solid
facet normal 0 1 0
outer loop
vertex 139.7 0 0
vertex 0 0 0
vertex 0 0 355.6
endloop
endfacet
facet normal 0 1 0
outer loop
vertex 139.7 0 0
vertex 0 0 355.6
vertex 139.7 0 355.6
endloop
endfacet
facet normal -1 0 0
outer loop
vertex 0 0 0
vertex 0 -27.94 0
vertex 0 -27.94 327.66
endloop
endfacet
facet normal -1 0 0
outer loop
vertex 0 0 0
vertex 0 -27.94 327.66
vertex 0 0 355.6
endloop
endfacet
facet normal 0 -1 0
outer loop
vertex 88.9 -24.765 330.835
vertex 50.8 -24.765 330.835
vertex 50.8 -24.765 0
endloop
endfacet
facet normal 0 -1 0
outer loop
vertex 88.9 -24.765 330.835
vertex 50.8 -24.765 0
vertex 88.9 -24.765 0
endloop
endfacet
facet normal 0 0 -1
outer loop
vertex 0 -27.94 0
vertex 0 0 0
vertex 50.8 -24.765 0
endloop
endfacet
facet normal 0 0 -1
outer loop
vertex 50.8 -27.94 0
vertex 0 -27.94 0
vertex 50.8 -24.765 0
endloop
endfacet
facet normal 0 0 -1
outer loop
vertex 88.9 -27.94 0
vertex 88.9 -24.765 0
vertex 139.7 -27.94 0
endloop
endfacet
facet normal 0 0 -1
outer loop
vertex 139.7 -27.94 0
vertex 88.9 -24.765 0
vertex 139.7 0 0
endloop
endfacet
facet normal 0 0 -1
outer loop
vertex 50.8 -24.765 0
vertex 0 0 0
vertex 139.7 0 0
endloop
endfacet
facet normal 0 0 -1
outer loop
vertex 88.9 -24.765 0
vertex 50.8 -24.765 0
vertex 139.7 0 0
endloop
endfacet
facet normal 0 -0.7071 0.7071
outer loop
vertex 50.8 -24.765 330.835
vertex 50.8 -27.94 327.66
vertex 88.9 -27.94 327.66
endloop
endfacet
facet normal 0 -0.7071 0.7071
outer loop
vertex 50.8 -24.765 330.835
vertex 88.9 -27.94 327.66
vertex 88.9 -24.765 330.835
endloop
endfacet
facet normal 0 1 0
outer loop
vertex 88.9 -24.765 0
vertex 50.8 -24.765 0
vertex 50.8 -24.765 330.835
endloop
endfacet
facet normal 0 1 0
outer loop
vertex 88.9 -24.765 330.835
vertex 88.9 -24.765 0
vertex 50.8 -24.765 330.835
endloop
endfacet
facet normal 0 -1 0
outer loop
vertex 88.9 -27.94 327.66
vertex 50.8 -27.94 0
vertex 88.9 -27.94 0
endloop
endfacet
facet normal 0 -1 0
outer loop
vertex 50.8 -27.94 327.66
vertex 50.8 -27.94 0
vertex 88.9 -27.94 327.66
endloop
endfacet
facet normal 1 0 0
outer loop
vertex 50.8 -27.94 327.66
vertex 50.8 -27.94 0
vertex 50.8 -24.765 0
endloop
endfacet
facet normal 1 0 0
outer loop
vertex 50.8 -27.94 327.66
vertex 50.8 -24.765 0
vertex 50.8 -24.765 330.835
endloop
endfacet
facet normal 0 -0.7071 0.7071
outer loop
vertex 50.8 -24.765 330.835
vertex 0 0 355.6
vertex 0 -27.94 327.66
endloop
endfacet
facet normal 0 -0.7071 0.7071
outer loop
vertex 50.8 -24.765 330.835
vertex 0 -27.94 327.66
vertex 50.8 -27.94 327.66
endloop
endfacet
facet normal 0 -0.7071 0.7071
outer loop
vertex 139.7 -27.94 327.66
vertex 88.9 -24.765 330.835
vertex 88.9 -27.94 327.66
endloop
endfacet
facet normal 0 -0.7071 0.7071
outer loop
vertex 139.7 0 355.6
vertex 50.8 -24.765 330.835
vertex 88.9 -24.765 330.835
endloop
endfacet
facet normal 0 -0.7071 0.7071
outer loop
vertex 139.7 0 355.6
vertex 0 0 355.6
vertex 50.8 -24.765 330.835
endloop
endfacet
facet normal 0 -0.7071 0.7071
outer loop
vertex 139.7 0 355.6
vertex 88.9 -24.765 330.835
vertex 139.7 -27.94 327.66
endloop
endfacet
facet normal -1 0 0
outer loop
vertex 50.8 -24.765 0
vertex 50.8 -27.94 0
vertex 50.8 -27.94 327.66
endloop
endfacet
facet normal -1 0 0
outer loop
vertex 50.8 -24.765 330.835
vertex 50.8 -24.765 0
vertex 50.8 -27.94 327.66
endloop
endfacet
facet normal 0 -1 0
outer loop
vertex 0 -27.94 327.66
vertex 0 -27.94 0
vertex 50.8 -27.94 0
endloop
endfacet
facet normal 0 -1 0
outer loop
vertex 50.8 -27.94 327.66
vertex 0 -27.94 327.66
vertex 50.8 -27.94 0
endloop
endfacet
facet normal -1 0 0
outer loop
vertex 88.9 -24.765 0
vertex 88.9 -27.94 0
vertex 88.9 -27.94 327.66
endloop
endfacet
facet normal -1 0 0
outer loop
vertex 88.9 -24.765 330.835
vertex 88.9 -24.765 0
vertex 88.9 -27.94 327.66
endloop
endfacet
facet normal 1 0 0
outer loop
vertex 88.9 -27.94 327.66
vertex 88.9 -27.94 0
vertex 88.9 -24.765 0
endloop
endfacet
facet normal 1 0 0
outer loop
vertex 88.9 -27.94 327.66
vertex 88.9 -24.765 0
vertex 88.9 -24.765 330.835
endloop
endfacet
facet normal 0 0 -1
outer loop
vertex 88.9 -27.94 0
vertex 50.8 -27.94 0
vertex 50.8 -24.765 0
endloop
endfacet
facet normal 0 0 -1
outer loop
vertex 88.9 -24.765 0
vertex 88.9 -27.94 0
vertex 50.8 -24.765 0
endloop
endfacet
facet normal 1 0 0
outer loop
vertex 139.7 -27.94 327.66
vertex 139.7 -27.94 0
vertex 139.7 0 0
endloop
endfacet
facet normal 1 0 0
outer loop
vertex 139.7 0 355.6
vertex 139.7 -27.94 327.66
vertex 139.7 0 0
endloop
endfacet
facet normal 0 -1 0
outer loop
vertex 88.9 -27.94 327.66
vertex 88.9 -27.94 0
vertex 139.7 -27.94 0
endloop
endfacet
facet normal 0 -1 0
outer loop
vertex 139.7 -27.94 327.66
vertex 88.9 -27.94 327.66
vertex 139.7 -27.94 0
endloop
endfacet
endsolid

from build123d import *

# Parameters (mm, degrees)
F0_W     = 139.7
F0_H     = 27.94
F1_DEPTH = 355.6
F2_SIZE  = 27.93999
F3_W     = 38.1
F3_H     = 355.6
F4_DEPTH = 3.175
F5_DEPTH = 38.1


# Not quite as in the source:
# - a fillet or chamfer is up to 0.001 mm smaller than in the source, because OpenCascade refuses the exact size


with BuildPart() as f1:
    # F0 (on Top) → F1 (new body)
    with BuildSketch(Plane.XY):
        with Locations((69.85, -13.97)):
            Rectangle(F0_W, F0_H)
    extrude(amount=F1_DEPTH)

    # F2 (size 27.94 in the source; OpenCascade refuses exactly that, so slightly less here)
    f2_edges = [f1.edges().sort_by_distance(p)[0] for p in [
        (69.85, -27.94, 355.6),
    ]]
    chamfer(f2_edges, length=F2_SIZE)

    # F3 (on face) → F4 (cut)
    with BuildSketch(Plane.XZ.offset(27.94)):
        with Locations((69.85, 177.8)):
            Rectangle(F3_W, F3_H)
    extrude(amount=-F4_DEPTH, mode=Mode.SUBTRACT)


with BuildPart() as f5:
    # F5 (new, through all): a face of the model
    f5_faces = [f1.part.faces().sort_by_distance(p)[0] for p in [
        (50.8, -26.3499485697, 164.6250307152),
    ]]
    extrude(f5_faces, amount=F5_DEPTH)


solid = Compound([f1.part, f5.part])
